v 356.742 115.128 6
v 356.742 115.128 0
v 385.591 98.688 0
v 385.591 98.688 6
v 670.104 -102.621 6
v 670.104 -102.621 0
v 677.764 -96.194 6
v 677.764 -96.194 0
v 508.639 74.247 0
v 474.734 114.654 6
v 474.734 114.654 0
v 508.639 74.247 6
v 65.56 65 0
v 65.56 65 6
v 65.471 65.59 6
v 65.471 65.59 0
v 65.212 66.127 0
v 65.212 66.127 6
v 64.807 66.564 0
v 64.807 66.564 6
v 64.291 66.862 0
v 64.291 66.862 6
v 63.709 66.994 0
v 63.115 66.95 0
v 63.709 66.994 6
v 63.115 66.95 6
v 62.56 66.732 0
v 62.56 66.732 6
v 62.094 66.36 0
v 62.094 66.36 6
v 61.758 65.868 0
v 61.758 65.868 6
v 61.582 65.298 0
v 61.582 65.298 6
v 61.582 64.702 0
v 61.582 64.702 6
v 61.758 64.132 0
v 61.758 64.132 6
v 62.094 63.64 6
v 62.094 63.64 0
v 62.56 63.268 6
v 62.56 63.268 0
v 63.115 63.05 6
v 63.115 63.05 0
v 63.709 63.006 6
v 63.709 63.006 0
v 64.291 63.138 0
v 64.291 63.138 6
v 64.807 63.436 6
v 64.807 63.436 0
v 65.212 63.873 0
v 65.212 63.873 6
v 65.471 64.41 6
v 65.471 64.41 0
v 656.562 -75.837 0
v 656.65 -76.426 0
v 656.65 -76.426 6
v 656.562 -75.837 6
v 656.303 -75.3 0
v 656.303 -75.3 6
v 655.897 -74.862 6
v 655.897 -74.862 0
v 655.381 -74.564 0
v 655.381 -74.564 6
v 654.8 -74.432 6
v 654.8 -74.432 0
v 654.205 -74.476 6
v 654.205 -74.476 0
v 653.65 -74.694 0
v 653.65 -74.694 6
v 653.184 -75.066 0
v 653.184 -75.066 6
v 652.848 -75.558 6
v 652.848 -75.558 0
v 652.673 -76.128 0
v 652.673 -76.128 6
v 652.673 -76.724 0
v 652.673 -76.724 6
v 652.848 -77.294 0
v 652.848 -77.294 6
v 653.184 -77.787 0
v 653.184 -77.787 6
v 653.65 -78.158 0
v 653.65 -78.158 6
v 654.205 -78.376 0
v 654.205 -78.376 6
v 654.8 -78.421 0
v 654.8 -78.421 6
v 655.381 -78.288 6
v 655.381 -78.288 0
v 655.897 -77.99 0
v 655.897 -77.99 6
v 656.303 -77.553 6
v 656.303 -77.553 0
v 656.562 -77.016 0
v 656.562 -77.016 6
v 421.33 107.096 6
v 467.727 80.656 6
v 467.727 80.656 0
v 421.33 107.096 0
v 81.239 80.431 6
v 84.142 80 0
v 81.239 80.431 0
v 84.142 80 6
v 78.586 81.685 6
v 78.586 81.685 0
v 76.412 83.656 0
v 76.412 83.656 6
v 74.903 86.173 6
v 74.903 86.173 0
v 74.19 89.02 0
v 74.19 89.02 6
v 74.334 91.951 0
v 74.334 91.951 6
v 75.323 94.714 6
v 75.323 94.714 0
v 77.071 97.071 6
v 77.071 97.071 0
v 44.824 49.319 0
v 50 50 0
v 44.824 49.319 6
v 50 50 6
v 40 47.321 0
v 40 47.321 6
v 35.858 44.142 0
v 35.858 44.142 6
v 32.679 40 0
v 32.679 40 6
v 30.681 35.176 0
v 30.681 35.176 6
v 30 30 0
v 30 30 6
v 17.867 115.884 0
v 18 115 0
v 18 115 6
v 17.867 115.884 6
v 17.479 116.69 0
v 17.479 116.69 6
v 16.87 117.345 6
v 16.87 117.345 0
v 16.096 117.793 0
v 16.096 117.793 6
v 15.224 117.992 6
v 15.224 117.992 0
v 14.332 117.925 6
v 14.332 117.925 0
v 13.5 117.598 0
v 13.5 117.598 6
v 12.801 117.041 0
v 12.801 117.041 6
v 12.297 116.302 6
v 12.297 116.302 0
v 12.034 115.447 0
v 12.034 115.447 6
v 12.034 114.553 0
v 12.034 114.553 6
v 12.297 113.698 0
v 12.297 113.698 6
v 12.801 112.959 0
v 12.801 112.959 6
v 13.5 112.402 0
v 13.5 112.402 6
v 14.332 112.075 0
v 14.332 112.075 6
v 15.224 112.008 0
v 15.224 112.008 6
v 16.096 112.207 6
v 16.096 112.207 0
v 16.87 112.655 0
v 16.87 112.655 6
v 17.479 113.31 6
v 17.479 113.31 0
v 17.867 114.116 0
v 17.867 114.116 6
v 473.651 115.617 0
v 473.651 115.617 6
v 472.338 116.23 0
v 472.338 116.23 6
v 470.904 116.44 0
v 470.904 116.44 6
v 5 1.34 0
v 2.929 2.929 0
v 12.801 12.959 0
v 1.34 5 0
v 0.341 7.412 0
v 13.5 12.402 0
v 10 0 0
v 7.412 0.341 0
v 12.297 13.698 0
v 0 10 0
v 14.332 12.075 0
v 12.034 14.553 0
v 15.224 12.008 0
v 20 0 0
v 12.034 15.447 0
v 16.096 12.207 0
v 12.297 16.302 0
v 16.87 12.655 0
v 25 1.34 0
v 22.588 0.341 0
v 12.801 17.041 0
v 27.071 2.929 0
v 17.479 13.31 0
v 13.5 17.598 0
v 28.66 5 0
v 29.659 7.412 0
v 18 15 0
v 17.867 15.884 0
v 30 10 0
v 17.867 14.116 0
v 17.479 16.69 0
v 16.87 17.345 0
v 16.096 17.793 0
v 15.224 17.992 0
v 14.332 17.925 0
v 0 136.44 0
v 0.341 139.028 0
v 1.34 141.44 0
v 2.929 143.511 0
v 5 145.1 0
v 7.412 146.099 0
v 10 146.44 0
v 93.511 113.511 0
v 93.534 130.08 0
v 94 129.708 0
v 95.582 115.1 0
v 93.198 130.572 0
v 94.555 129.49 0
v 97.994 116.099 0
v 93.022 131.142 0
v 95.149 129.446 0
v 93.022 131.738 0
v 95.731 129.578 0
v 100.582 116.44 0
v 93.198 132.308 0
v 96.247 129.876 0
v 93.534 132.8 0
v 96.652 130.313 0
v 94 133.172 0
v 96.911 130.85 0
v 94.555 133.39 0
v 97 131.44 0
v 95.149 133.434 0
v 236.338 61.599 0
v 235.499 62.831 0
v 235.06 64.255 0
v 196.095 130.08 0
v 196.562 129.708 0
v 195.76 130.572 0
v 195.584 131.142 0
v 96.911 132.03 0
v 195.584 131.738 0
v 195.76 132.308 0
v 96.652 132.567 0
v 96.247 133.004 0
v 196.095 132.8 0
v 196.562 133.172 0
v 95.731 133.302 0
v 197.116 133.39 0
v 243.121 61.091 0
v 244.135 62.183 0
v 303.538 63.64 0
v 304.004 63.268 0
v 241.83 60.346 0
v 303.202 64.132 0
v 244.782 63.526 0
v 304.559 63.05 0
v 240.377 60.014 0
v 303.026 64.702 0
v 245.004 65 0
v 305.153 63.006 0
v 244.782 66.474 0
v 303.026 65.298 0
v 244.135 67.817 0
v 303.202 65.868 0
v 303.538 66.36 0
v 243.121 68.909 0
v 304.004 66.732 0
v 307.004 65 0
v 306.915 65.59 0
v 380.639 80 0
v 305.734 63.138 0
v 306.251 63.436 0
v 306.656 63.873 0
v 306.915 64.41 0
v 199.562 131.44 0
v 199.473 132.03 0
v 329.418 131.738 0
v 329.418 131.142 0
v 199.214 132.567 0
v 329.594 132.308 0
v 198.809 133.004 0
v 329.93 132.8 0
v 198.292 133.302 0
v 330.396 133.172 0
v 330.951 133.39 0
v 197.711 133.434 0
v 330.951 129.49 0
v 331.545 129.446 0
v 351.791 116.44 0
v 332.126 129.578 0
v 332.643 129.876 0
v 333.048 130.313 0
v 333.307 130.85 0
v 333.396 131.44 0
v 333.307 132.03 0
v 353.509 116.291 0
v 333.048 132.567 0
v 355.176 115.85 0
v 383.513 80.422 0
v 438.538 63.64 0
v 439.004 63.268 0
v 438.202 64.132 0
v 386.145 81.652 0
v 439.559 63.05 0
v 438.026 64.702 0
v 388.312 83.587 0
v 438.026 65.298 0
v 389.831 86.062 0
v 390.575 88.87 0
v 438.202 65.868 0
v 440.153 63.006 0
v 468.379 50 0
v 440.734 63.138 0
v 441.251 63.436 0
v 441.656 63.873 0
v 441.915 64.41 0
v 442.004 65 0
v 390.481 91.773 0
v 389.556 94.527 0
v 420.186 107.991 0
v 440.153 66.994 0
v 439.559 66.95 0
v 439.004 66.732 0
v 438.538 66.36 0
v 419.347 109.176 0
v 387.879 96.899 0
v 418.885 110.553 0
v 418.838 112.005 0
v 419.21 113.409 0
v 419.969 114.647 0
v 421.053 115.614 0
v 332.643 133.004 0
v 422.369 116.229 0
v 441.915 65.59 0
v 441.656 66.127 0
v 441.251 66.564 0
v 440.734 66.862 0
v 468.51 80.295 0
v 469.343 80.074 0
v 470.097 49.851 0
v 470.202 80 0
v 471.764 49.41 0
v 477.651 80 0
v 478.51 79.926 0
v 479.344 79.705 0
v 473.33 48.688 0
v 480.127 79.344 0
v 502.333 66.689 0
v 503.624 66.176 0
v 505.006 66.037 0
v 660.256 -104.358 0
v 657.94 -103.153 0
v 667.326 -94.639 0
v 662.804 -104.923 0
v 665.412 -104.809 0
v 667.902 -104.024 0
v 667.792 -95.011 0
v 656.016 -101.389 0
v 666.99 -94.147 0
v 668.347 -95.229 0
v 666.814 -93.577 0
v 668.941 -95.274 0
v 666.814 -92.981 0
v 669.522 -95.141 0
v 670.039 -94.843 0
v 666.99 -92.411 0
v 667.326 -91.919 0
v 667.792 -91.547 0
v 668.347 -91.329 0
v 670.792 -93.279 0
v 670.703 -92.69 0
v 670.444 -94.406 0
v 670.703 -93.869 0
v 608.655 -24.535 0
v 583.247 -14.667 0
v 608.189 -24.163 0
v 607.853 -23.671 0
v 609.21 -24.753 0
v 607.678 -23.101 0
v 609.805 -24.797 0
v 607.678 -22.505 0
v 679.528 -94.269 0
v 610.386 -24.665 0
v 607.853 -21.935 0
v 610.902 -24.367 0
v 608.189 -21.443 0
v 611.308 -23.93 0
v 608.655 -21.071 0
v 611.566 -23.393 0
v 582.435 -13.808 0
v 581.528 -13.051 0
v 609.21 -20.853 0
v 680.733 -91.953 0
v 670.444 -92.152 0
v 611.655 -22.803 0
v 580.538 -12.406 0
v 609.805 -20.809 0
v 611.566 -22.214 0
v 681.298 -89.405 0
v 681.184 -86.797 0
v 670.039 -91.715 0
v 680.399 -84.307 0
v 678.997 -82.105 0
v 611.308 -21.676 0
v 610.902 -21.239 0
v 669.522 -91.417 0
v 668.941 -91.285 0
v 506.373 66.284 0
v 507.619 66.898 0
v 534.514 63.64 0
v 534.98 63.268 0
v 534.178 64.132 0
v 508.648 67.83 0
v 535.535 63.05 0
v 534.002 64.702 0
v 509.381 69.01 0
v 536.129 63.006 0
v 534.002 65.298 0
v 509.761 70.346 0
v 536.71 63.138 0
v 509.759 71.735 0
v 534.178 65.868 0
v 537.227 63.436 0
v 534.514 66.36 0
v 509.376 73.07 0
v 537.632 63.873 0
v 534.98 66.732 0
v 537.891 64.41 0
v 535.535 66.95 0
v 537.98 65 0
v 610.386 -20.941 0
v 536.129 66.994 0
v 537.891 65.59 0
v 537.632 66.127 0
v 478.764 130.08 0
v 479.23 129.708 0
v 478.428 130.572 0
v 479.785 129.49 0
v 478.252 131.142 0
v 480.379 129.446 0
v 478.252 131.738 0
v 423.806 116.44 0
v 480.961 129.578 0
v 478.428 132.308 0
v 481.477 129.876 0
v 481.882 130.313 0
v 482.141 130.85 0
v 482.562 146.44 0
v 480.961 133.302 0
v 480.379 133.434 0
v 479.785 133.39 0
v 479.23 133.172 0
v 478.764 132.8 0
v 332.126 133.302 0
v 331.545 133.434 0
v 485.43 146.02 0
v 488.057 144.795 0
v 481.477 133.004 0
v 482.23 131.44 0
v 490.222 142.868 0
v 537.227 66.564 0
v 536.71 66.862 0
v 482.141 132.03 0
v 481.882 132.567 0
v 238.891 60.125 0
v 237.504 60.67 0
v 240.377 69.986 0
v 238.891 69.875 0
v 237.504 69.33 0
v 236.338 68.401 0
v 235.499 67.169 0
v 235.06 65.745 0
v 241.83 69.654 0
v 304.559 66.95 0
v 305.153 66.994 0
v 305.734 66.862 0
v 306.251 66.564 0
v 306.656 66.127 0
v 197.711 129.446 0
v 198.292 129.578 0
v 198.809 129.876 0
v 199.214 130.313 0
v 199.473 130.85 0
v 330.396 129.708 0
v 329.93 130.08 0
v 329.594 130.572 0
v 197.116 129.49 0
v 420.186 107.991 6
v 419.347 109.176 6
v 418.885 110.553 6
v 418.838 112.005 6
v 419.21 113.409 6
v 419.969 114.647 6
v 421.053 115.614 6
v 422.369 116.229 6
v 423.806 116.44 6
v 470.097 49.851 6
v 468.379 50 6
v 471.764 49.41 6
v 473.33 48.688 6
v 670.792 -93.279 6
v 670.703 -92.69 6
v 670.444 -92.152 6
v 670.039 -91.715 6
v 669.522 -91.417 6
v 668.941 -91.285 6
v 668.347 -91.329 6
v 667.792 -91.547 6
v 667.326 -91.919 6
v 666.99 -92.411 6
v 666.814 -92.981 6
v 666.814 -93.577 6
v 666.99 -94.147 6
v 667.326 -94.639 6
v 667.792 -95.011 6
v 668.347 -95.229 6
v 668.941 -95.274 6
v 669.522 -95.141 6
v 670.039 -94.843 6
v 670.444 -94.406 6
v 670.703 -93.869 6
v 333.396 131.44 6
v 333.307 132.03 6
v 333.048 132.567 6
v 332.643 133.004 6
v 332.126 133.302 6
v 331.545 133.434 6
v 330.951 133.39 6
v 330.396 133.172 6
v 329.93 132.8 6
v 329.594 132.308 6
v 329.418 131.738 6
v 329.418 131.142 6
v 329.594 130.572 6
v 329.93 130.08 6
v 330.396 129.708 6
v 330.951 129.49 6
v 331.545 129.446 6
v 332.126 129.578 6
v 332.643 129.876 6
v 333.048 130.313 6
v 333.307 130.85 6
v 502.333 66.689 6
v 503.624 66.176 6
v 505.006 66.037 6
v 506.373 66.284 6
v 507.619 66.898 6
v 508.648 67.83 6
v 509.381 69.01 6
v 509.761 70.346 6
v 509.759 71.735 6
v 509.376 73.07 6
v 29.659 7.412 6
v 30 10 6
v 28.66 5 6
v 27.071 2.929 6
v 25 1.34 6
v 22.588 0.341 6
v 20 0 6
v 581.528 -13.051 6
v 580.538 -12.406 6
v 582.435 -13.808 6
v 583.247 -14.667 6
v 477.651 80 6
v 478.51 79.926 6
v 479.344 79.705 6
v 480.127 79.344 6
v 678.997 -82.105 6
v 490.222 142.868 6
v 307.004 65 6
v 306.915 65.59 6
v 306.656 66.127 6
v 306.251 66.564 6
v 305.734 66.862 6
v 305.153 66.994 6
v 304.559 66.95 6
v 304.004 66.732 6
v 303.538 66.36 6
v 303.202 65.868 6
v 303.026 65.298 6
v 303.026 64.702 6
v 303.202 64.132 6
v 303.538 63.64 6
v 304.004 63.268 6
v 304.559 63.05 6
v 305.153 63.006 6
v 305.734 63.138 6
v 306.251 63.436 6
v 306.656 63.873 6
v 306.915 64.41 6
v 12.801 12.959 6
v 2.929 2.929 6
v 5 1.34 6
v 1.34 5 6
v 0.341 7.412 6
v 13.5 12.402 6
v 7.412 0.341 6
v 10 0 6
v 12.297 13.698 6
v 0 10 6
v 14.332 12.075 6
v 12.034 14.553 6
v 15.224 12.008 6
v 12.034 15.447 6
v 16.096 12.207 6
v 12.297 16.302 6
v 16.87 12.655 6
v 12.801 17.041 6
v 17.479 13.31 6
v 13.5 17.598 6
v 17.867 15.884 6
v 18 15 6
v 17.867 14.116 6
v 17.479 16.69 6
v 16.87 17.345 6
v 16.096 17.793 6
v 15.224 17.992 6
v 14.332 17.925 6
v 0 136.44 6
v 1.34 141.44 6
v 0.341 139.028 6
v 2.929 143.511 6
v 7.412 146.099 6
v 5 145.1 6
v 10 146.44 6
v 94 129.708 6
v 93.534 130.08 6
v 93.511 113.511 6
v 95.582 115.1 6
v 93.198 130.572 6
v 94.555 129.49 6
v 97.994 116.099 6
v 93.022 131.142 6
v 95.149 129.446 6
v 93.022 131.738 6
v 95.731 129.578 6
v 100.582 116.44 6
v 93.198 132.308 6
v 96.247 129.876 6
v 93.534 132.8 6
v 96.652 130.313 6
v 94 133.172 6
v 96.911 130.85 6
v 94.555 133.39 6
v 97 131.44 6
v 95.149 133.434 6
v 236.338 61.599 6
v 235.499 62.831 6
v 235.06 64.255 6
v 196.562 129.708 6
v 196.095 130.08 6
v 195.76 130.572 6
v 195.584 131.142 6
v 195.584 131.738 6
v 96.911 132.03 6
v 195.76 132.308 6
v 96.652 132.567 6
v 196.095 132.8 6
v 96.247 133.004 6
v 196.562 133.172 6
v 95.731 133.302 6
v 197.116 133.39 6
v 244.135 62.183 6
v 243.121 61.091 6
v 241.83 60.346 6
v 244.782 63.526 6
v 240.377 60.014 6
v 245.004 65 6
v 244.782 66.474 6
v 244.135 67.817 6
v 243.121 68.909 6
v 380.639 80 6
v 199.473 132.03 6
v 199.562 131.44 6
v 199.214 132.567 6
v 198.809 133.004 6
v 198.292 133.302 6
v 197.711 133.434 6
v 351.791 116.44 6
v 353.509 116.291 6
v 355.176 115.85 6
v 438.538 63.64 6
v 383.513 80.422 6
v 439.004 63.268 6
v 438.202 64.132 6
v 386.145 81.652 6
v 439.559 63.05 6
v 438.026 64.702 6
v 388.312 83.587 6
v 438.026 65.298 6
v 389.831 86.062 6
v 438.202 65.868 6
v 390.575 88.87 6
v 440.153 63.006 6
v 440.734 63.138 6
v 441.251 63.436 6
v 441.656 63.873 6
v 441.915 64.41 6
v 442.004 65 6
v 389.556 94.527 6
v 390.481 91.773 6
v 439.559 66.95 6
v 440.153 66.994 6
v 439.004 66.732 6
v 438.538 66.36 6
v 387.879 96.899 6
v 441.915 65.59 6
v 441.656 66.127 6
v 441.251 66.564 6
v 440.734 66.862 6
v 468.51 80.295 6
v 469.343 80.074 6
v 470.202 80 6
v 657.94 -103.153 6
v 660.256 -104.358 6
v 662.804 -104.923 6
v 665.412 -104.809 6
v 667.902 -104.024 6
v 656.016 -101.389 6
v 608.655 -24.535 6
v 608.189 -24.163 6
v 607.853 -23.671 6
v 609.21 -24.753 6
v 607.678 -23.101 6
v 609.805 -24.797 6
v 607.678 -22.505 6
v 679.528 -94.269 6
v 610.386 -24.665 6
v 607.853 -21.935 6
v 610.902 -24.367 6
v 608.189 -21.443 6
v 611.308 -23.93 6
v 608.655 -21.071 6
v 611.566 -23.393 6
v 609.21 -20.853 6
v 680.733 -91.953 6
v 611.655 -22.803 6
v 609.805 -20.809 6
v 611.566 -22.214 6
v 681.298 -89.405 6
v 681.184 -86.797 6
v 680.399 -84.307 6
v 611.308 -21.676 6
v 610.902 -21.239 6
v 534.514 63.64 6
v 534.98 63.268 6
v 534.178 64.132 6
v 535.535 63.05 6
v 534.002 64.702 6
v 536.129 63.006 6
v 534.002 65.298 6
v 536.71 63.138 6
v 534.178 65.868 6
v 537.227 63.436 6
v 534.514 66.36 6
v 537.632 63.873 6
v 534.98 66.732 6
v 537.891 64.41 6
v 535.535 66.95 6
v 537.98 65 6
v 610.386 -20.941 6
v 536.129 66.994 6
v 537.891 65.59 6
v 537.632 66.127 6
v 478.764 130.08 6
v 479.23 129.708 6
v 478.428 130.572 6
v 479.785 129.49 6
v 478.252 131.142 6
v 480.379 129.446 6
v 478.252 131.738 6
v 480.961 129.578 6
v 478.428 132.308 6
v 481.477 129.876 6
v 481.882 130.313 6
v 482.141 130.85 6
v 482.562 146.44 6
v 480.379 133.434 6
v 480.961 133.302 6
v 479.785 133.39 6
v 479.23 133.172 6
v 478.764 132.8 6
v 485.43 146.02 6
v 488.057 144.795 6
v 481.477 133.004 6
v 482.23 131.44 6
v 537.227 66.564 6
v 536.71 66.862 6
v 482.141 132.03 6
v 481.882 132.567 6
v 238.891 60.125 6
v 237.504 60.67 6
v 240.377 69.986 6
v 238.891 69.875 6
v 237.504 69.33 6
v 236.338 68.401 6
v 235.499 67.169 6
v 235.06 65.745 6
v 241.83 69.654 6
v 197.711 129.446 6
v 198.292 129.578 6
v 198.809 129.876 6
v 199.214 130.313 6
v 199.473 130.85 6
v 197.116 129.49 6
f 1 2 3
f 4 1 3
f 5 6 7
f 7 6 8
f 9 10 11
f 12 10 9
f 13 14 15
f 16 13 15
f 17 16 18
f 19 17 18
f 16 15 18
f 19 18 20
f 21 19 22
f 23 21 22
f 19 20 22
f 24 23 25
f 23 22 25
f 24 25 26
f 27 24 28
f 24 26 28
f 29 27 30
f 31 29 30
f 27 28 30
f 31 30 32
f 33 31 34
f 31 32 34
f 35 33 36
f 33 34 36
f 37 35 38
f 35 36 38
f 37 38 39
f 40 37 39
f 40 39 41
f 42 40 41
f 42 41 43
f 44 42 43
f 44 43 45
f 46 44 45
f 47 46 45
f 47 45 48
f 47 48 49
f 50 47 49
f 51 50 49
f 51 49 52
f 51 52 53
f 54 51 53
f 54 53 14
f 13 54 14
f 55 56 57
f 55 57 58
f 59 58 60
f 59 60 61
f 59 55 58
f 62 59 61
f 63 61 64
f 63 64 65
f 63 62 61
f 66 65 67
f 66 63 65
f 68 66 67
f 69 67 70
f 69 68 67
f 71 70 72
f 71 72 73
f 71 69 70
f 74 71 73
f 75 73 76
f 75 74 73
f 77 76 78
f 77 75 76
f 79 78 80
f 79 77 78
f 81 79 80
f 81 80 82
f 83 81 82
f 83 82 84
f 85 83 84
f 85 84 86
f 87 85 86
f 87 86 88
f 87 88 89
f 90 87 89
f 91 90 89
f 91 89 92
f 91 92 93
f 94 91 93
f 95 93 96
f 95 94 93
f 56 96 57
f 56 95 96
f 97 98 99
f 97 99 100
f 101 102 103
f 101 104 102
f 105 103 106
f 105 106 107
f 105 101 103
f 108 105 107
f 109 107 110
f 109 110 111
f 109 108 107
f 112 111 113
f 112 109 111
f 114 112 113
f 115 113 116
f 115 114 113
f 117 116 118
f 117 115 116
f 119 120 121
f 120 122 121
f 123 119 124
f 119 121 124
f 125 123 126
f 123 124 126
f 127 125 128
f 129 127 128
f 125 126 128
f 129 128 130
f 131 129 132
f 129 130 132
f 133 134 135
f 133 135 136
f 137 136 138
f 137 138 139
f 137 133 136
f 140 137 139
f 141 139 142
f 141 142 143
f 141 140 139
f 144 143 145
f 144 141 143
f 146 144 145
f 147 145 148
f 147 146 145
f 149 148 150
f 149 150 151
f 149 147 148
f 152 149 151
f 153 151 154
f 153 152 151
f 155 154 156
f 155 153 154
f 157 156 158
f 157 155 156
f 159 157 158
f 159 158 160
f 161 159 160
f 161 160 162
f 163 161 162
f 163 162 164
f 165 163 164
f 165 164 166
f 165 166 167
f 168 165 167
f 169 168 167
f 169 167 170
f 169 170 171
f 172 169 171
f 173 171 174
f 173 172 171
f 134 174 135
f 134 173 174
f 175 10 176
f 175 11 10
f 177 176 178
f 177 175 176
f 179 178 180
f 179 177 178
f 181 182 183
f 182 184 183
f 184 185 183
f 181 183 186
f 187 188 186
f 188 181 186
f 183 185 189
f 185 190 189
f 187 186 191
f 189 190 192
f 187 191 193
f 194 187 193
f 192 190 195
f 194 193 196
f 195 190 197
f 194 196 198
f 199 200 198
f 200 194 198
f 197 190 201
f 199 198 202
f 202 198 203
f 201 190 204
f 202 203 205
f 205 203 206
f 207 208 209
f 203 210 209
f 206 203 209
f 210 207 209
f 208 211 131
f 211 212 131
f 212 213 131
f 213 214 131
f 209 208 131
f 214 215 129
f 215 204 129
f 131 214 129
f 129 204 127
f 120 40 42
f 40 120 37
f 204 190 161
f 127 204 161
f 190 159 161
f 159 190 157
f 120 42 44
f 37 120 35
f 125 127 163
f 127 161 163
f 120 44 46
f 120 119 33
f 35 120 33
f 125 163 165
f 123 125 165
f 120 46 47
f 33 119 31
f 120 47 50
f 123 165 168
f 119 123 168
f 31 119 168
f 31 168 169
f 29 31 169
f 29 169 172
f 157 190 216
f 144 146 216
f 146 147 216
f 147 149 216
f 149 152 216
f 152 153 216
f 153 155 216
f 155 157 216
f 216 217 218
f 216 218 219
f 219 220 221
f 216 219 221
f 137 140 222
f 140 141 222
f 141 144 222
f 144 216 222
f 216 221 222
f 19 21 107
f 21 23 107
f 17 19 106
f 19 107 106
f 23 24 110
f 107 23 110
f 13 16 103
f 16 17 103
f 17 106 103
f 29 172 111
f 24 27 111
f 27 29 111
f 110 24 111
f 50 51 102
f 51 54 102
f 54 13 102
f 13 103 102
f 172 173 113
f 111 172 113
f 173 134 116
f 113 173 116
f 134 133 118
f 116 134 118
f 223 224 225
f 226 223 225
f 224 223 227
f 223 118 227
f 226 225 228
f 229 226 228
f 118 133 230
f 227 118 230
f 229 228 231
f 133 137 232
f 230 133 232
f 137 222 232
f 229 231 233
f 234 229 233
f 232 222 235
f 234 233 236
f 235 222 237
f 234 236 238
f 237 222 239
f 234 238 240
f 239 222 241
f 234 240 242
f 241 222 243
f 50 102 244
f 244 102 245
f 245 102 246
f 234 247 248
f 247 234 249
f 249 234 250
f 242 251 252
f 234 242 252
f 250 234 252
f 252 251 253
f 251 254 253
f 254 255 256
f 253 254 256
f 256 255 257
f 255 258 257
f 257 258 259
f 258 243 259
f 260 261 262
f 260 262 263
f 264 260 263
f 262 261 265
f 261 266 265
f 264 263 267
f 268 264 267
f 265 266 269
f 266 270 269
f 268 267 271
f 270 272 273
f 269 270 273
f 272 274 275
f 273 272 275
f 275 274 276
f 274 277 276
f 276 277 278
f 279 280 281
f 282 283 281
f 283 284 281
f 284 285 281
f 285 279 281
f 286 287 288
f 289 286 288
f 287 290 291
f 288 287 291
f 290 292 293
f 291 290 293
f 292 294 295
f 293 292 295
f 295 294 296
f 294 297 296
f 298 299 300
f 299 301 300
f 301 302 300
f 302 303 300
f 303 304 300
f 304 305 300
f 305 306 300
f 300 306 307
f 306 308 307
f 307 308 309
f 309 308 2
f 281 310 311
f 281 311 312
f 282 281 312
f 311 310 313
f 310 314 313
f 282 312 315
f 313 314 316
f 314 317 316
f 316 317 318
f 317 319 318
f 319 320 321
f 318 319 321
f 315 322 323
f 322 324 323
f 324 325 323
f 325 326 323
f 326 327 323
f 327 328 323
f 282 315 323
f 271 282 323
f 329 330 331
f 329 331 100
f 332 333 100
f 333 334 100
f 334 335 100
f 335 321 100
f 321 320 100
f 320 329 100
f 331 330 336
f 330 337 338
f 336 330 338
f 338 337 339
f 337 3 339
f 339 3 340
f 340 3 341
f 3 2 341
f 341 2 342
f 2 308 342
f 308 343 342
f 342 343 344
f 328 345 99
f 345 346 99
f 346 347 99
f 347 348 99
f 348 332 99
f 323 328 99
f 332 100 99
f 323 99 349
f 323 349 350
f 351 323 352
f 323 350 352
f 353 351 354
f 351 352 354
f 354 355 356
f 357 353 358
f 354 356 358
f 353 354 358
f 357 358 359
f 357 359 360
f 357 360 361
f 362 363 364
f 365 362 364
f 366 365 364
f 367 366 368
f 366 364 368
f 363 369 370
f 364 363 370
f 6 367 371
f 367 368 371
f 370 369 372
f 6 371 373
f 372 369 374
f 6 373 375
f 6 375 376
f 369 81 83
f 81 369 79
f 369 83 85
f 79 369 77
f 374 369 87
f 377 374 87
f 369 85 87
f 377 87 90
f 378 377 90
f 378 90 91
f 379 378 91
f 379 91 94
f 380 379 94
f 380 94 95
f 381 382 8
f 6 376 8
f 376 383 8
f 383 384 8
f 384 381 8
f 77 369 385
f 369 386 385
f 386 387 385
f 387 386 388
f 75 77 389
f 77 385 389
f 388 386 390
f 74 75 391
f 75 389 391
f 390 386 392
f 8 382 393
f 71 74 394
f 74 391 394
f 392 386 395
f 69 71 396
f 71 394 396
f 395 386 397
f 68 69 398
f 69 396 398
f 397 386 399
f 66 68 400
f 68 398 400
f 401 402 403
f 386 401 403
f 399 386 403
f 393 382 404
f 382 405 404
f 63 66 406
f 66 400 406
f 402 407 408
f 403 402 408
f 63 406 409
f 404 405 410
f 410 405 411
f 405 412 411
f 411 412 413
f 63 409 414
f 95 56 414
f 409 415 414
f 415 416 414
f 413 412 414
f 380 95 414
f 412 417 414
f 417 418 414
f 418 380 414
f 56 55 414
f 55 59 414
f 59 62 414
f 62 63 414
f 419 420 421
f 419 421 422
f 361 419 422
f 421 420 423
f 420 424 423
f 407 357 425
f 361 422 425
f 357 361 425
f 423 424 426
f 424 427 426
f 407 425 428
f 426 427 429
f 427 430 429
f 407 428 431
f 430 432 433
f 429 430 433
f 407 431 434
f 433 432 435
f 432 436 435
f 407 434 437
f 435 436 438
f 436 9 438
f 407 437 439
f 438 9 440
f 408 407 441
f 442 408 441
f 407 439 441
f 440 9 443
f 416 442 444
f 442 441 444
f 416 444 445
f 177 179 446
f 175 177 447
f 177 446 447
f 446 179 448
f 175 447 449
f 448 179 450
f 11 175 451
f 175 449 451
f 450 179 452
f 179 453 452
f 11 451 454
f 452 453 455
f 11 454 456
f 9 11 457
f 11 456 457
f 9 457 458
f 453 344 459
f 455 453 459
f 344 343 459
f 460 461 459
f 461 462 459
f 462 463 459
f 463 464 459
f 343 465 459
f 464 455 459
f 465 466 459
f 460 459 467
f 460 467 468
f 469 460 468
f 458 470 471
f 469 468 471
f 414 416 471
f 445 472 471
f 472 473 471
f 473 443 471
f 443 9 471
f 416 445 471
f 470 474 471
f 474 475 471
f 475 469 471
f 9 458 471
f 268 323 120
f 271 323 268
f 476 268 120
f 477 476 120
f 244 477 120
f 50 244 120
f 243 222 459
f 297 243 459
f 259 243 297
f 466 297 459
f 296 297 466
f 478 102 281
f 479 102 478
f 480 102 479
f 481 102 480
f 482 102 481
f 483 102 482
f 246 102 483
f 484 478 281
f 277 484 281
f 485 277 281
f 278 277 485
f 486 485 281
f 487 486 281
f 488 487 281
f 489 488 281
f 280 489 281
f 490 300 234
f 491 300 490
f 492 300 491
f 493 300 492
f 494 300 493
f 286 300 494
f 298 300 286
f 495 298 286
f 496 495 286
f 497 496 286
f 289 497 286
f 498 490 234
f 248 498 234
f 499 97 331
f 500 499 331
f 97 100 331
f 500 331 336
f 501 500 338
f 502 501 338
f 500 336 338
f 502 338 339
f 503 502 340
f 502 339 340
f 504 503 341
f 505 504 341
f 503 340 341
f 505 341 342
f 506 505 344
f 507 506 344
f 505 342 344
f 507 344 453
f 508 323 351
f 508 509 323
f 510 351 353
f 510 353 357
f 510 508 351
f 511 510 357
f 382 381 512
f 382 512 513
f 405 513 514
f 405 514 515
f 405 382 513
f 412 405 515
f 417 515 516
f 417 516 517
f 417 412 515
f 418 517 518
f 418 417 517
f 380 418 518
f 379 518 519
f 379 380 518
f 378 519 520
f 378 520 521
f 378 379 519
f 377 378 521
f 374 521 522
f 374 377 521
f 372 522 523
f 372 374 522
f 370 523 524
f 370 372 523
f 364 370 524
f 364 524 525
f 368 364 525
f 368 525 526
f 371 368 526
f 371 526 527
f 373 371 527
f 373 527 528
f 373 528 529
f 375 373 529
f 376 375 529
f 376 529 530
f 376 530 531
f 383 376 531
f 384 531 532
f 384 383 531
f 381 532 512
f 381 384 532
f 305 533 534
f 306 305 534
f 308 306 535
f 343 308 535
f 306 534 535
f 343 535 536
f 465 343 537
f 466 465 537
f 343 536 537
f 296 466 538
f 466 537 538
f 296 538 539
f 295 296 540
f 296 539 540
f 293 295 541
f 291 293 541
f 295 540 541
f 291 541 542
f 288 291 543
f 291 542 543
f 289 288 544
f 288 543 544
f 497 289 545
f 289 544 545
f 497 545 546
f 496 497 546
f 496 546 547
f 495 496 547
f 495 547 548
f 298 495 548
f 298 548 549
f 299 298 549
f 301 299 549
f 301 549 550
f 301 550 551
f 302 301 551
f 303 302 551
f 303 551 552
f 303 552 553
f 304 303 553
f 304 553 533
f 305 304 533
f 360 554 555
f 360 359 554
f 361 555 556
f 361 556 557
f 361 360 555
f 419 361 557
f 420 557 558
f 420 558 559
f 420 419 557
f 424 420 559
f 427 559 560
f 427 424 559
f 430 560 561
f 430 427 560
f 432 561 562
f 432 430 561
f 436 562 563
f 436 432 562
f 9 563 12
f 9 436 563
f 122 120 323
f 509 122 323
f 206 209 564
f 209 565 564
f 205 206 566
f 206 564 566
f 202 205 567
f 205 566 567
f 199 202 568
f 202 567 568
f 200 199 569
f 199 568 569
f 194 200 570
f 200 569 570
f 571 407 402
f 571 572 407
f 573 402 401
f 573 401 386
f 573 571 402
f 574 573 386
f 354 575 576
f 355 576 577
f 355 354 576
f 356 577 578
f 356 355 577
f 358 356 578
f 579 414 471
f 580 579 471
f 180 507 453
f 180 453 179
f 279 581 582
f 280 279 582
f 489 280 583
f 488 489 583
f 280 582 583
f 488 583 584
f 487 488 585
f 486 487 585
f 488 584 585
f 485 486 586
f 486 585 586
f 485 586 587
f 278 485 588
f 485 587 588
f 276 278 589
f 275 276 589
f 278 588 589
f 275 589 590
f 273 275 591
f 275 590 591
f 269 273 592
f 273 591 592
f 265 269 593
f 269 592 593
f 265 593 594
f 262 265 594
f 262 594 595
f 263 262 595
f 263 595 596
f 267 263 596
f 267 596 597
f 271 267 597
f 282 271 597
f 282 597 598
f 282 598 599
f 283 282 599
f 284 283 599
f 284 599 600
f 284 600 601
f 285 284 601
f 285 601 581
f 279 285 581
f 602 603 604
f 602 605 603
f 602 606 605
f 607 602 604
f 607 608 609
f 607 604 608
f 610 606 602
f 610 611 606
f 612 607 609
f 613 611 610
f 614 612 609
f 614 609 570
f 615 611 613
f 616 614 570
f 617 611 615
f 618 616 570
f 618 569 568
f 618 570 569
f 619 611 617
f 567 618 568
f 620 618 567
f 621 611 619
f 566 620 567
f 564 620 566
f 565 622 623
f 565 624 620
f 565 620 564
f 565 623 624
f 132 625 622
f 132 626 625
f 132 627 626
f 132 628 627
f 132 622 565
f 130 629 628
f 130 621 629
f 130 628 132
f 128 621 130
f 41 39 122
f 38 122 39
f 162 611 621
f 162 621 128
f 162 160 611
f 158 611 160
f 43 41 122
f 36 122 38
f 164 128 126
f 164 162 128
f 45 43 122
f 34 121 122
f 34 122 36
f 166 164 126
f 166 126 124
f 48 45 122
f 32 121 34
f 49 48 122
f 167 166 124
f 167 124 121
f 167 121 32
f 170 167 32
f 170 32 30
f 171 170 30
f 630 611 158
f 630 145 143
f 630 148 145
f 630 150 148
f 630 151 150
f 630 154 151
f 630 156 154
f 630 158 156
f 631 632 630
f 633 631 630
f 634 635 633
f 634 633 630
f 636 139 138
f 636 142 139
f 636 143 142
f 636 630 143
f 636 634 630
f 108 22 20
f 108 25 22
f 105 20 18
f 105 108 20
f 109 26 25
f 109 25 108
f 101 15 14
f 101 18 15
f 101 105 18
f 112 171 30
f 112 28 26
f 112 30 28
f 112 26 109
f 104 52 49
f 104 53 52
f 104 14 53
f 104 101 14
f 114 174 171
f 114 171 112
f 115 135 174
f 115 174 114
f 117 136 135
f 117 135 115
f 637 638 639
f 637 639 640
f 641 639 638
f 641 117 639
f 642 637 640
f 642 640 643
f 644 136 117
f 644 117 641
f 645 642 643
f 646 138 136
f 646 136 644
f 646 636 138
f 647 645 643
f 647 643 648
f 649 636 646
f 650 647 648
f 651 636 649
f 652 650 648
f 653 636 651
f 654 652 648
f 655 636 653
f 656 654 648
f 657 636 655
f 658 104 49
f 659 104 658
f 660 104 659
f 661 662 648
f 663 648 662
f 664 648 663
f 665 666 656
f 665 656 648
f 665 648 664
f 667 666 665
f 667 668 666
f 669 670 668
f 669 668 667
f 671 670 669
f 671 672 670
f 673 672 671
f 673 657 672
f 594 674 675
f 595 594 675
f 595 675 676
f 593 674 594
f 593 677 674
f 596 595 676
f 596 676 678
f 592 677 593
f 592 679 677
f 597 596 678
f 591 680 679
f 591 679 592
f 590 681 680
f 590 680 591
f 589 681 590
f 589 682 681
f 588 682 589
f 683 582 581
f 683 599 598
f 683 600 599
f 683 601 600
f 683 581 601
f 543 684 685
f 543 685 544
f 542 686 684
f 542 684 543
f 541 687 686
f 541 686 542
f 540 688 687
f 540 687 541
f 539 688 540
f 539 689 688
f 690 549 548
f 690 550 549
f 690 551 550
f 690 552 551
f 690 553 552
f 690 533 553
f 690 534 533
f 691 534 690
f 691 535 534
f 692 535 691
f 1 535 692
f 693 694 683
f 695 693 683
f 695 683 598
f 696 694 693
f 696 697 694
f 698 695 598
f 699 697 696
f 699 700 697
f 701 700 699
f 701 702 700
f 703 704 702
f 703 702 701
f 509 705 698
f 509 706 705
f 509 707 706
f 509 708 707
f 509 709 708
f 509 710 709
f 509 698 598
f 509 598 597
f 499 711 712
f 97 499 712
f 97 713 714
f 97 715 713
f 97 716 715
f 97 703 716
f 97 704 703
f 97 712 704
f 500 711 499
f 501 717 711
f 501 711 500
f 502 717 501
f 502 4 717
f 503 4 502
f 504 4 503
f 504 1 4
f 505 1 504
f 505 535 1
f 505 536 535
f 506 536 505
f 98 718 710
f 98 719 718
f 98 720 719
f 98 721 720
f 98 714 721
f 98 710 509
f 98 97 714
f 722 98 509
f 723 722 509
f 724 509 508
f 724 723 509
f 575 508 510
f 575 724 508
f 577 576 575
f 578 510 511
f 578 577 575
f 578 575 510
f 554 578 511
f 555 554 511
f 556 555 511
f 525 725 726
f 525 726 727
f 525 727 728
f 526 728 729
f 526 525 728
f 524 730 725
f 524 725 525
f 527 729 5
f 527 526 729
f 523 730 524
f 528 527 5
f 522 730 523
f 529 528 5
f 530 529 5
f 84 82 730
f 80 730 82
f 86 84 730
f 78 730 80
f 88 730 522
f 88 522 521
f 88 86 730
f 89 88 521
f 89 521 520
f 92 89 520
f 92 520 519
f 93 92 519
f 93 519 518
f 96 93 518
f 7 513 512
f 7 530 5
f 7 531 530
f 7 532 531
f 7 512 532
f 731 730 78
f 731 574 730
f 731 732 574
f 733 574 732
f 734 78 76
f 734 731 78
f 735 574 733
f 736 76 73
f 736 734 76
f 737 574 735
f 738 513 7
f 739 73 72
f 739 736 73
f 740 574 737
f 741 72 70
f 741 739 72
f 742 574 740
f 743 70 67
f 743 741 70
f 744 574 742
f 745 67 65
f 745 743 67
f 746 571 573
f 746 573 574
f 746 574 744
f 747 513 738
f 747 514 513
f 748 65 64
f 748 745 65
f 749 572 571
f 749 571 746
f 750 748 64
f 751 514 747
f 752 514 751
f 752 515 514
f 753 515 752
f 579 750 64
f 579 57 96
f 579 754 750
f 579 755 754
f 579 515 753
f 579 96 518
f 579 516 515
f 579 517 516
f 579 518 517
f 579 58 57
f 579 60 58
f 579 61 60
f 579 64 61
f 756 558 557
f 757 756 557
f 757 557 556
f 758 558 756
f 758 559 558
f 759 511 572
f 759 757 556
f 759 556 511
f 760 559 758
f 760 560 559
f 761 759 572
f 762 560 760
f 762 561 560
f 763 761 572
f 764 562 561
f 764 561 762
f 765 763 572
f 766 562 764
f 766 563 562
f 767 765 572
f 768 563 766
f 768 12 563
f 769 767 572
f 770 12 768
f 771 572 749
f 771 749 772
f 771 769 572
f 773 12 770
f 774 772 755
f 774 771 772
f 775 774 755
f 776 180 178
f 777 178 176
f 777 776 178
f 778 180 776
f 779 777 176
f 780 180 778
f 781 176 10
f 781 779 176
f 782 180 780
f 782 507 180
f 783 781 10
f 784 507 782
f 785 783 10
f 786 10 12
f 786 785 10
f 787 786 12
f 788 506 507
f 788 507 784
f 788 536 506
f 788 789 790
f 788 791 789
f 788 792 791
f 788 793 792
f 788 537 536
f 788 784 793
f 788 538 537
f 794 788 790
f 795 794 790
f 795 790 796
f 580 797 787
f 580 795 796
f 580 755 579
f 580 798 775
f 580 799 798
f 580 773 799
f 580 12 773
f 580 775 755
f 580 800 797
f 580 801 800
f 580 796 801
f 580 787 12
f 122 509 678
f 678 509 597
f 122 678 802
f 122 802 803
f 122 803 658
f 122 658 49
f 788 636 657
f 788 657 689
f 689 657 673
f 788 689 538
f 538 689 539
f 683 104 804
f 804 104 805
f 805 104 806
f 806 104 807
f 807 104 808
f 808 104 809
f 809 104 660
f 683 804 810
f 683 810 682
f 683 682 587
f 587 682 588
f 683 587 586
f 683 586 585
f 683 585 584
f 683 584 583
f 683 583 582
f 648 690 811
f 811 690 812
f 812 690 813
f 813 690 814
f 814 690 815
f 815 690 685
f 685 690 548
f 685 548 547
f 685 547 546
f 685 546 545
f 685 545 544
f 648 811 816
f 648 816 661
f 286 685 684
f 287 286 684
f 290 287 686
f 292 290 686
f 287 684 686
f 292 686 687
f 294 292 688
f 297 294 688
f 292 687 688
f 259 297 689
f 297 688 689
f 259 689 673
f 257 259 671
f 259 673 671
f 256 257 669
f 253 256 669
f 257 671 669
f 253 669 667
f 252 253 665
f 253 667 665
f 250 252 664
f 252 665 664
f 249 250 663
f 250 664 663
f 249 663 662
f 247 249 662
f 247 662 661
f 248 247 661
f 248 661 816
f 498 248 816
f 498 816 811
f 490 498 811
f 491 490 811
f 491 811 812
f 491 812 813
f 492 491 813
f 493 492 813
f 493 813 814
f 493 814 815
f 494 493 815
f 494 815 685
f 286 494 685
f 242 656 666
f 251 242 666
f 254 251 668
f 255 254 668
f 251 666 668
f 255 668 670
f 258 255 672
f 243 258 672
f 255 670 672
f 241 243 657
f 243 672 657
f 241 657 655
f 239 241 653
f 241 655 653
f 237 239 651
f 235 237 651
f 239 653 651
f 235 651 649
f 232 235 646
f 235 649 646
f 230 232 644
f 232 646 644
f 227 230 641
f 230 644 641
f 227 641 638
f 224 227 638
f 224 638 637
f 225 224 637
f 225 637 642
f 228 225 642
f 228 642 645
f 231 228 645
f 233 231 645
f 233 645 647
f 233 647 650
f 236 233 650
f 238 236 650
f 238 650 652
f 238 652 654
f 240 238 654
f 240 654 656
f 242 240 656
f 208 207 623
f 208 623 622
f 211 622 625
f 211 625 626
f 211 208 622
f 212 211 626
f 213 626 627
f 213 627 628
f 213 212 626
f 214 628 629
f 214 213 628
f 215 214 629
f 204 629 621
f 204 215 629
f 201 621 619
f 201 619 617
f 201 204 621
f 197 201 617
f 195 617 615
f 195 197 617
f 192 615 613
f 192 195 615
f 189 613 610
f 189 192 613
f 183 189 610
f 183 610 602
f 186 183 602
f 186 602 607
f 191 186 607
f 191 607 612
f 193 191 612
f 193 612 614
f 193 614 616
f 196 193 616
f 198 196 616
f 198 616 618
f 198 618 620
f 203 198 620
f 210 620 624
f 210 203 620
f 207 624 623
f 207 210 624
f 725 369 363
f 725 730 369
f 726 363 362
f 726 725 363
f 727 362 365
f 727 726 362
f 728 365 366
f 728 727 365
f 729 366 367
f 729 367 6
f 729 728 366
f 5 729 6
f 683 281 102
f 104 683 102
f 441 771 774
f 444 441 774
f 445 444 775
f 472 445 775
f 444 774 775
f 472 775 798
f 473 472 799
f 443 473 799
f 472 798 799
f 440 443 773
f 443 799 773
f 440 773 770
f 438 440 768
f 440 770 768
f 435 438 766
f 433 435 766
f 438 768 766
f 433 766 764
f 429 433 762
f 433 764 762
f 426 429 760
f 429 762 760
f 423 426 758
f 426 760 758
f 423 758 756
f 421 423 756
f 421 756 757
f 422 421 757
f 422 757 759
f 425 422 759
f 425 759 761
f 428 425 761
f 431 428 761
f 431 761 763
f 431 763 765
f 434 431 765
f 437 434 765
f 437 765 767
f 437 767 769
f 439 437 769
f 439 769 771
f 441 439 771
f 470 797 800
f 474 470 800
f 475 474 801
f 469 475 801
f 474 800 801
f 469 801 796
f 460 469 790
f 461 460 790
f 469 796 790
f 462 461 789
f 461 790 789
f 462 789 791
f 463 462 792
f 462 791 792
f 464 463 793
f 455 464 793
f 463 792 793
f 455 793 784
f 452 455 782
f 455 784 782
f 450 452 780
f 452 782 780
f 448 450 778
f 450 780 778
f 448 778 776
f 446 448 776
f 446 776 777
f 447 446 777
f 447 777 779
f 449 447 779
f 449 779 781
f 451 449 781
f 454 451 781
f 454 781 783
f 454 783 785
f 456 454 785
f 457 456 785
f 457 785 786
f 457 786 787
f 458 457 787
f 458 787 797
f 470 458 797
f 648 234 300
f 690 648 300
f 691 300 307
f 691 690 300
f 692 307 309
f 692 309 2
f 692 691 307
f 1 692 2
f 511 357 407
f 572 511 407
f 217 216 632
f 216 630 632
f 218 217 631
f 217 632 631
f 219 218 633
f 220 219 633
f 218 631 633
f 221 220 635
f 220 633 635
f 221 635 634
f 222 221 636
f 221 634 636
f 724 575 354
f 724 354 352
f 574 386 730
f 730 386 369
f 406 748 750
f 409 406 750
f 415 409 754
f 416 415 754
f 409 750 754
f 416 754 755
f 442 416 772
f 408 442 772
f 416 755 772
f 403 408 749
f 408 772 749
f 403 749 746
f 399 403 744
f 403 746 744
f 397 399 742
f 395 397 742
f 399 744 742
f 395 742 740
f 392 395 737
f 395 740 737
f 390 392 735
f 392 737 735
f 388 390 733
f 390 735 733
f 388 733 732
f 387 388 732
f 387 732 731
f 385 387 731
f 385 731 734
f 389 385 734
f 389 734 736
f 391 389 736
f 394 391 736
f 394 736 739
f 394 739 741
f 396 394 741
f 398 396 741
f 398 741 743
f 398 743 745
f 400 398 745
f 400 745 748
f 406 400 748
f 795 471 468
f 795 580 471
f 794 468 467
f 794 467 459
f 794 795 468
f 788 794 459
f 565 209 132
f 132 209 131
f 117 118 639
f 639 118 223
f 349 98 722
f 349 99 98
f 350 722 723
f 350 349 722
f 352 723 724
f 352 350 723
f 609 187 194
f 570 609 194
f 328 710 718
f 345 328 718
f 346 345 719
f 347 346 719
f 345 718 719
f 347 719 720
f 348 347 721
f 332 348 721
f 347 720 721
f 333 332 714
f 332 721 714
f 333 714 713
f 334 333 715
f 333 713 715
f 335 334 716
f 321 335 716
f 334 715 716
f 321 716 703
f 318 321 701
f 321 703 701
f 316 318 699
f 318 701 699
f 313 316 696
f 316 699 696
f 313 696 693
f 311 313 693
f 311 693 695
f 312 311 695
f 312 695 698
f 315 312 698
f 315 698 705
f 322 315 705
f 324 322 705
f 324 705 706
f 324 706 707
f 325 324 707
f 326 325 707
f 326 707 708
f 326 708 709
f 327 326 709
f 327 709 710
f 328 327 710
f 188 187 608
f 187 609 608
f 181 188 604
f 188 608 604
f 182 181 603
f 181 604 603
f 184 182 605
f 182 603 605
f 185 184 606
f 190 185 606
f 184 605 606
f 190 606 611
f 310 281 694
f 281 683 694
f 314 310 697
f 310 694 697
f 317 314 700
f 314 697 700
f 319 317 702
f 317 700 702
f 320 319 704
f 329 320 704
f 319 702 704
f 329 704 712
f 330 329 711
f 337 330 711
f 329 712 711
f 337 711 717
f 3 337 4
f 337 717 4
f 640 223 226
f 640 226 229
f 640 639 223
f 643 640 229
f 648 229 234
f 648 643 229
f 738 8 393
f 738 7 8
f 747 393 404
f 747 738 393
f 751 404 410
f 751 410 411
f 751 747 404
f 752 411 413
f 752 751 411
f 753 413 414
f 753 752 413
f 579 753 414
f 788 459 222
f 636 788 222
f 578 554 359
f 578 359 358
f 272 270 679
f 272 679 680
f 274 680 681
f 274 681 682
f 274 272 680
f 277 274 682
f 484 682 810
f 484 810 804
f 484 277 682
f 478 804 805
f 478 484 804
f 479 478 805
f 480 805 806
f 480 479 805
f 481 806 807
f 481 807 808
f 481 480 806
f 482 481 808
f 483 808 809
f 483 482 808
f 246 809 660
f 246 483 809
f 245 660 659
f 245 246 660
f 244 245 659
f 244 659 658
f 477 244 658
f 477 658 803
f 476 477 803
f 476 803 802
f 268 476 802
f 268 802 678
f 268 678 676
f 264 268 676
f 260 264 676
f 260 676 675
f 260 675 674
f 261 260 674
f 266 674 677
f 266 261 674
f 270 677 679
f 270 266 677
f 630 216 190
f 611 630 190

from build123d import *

# Parameters (mm, degrees)
SKETCH1_R           = 2
SKETCH1_R_2         = 3
SKETCH1_R_3         = 5
BOSS_EXTRUDE1_DEPTH = 6
FILLET1_R           = 20
FILLET2_R           = 10
CUT_EXTRUDE1_DEPTH  = 697.921769691
FILLET3_R           = 5
SKETCH3_R           = 2
CUT_EXTRUDE2_DEPTH  = 697.921769691
SKETCH9_R           = 2
CUT_EXTRUDE4_DEPTH  = 697.921769691


with BuildPart() as part:
    # Sketch1 → Boss-Extrude1 (new body)
    # profile 1 of 2: a face of its own
    with BuildSketch(Plane.XY):
        Polygon((0, 146.44), (0, 0), (30, 0), (30, 50), (60, 80), (96.44, 116.44), (354.44, 116.44), (418.384389798, 80), (471.027959885, 50), (582.094928321, -13.293751689), (662.443379532, -109.049307079), (685.424712826, -89.765678789), (487.224614872, 146.44), align=None)
        with Locations((668.791745302, -93.279137389)):
            Circle(SKETCH1_R, mode=Mode.SUBTRACT)
        with Locations((654.650417888, -76.42615964)):
            Circle(SKETCH1_R, mode=Mode.SUBTRACT)
        with Locations((15, 15)):
            Circle(SKETCH1_R_2, mode=Mode.SUBTRACT)
        with Locations((15, 115)):
            Circle(SKETCH1_R_2, mode=Mode.SUBTRACT)
    # profile 2 of 2: a face of its own
    with BuildSketch(Plane.XY):
        Polygon((60, 80), (30, 50), (471.027959885, 50), (418.384389798, 80), align=None)
        with Locations((240.003736421, 65)):
            Circle(SKETCH1_R_3, mode=Mode.SUBTRACT)
    extrude(amount=BOSS_EXTRUDE1_DEPTH)

    # Fillet1
    fillet1_edges = [part.edges().sort_by_distance(p)[0] for p in [
        (30, 50, 3),
    ]]
    fillet(fillet1_edges, radius=FILLET1_R)

    # Fillet2
    fillet2_edges = [part.edges().sort_by_distance(p)[0] for p in [
        (418.384389798, 80, 3),
        (354.44, 116.44, 3),
        (96.44, 116.44, 3),
        (60, 80, 3),
        (30, 0, 3),
        (0, 0, 3),
        (0, 146.44, 3),
        (487.224614872, 146.44, 3),
        (685.424712826, -89.765678789, 3),
        (662.443379532, -109.049307079, 3),
        (582.094928321, -13.293751689, 3),
        (471.027959885, 50, 3),
    ]]
    fillet(fillet2_edges, radius=FILLET2_R)

    # Sketch2 → Cut-Extrude1 (cut, through all)
    with BuildSketch(Plane.XY.offset(6)):
        Polygon((404.933023937, 116.44), (473.235385128, 116.44), (526.571079334, 52.876994817), (478.976018523, 80), (468.877413735, 80), align=None)
    extrude(amount=-CUT_EXTRUDE1_DEPTH, mode=Mode.SUBTRACT)

    # Fillet3
    fillet3_edges = [part.edges().sort_by_distance(p)[0] for p in [
        (468.877413735, 80, 3),
        (404.933023937, 116.44, 3),
        (473.235385128, 116.44, 3),
        (526.571079334, 52.876994817, 3),
        (478.976018523, 80, 3),
    ]]
    fillet(fillet3_edges, radius=FILLET3_R)

    # Sketch3 → Cut-Extrude2 (cut, through all)
    with BuildSketch(Plane.XY.offset(6)):
        with Locations((609.65528521, -22.803048622)):
            Circle(SKETCH3_R)
        with Locations((440.003736421, 65)):
            Circle(SKETCH3_R)
        with Locations((535.979779495, 65)):
            Circle(SKETCH3_R)
        with Locations((480.23, 131.44)):
            Circle(SKETCH3_R)
        with Locations((305.003736421, 65)):
            Circle(SKETCH3_R)
        with Locations((331.395769145, 131.44)):
            Circle(SKETCH3_R)
        with Locations((197.561538291, 131.44)):
            Circle(SKETCH3_R)
    extrude(amount=-CUT_EXTRUDE2_DEPTH, mode=Mode.SUBTRACT)

    # Sketch9 → Cut-Extrude4 (cut, through all)
    with BuildSketch(Plane.XY.offset(6)):
        with Locations((95, 131.44)):
            Circle(SKETCH9_R)
        with Locations((63.56, 65)):
            Circle(SKETCH9_R)
    extrude(amount=-CUT_EXTRUDE4_DEPTH, mode=Mode.SUBTRACT)


solid = part.part
